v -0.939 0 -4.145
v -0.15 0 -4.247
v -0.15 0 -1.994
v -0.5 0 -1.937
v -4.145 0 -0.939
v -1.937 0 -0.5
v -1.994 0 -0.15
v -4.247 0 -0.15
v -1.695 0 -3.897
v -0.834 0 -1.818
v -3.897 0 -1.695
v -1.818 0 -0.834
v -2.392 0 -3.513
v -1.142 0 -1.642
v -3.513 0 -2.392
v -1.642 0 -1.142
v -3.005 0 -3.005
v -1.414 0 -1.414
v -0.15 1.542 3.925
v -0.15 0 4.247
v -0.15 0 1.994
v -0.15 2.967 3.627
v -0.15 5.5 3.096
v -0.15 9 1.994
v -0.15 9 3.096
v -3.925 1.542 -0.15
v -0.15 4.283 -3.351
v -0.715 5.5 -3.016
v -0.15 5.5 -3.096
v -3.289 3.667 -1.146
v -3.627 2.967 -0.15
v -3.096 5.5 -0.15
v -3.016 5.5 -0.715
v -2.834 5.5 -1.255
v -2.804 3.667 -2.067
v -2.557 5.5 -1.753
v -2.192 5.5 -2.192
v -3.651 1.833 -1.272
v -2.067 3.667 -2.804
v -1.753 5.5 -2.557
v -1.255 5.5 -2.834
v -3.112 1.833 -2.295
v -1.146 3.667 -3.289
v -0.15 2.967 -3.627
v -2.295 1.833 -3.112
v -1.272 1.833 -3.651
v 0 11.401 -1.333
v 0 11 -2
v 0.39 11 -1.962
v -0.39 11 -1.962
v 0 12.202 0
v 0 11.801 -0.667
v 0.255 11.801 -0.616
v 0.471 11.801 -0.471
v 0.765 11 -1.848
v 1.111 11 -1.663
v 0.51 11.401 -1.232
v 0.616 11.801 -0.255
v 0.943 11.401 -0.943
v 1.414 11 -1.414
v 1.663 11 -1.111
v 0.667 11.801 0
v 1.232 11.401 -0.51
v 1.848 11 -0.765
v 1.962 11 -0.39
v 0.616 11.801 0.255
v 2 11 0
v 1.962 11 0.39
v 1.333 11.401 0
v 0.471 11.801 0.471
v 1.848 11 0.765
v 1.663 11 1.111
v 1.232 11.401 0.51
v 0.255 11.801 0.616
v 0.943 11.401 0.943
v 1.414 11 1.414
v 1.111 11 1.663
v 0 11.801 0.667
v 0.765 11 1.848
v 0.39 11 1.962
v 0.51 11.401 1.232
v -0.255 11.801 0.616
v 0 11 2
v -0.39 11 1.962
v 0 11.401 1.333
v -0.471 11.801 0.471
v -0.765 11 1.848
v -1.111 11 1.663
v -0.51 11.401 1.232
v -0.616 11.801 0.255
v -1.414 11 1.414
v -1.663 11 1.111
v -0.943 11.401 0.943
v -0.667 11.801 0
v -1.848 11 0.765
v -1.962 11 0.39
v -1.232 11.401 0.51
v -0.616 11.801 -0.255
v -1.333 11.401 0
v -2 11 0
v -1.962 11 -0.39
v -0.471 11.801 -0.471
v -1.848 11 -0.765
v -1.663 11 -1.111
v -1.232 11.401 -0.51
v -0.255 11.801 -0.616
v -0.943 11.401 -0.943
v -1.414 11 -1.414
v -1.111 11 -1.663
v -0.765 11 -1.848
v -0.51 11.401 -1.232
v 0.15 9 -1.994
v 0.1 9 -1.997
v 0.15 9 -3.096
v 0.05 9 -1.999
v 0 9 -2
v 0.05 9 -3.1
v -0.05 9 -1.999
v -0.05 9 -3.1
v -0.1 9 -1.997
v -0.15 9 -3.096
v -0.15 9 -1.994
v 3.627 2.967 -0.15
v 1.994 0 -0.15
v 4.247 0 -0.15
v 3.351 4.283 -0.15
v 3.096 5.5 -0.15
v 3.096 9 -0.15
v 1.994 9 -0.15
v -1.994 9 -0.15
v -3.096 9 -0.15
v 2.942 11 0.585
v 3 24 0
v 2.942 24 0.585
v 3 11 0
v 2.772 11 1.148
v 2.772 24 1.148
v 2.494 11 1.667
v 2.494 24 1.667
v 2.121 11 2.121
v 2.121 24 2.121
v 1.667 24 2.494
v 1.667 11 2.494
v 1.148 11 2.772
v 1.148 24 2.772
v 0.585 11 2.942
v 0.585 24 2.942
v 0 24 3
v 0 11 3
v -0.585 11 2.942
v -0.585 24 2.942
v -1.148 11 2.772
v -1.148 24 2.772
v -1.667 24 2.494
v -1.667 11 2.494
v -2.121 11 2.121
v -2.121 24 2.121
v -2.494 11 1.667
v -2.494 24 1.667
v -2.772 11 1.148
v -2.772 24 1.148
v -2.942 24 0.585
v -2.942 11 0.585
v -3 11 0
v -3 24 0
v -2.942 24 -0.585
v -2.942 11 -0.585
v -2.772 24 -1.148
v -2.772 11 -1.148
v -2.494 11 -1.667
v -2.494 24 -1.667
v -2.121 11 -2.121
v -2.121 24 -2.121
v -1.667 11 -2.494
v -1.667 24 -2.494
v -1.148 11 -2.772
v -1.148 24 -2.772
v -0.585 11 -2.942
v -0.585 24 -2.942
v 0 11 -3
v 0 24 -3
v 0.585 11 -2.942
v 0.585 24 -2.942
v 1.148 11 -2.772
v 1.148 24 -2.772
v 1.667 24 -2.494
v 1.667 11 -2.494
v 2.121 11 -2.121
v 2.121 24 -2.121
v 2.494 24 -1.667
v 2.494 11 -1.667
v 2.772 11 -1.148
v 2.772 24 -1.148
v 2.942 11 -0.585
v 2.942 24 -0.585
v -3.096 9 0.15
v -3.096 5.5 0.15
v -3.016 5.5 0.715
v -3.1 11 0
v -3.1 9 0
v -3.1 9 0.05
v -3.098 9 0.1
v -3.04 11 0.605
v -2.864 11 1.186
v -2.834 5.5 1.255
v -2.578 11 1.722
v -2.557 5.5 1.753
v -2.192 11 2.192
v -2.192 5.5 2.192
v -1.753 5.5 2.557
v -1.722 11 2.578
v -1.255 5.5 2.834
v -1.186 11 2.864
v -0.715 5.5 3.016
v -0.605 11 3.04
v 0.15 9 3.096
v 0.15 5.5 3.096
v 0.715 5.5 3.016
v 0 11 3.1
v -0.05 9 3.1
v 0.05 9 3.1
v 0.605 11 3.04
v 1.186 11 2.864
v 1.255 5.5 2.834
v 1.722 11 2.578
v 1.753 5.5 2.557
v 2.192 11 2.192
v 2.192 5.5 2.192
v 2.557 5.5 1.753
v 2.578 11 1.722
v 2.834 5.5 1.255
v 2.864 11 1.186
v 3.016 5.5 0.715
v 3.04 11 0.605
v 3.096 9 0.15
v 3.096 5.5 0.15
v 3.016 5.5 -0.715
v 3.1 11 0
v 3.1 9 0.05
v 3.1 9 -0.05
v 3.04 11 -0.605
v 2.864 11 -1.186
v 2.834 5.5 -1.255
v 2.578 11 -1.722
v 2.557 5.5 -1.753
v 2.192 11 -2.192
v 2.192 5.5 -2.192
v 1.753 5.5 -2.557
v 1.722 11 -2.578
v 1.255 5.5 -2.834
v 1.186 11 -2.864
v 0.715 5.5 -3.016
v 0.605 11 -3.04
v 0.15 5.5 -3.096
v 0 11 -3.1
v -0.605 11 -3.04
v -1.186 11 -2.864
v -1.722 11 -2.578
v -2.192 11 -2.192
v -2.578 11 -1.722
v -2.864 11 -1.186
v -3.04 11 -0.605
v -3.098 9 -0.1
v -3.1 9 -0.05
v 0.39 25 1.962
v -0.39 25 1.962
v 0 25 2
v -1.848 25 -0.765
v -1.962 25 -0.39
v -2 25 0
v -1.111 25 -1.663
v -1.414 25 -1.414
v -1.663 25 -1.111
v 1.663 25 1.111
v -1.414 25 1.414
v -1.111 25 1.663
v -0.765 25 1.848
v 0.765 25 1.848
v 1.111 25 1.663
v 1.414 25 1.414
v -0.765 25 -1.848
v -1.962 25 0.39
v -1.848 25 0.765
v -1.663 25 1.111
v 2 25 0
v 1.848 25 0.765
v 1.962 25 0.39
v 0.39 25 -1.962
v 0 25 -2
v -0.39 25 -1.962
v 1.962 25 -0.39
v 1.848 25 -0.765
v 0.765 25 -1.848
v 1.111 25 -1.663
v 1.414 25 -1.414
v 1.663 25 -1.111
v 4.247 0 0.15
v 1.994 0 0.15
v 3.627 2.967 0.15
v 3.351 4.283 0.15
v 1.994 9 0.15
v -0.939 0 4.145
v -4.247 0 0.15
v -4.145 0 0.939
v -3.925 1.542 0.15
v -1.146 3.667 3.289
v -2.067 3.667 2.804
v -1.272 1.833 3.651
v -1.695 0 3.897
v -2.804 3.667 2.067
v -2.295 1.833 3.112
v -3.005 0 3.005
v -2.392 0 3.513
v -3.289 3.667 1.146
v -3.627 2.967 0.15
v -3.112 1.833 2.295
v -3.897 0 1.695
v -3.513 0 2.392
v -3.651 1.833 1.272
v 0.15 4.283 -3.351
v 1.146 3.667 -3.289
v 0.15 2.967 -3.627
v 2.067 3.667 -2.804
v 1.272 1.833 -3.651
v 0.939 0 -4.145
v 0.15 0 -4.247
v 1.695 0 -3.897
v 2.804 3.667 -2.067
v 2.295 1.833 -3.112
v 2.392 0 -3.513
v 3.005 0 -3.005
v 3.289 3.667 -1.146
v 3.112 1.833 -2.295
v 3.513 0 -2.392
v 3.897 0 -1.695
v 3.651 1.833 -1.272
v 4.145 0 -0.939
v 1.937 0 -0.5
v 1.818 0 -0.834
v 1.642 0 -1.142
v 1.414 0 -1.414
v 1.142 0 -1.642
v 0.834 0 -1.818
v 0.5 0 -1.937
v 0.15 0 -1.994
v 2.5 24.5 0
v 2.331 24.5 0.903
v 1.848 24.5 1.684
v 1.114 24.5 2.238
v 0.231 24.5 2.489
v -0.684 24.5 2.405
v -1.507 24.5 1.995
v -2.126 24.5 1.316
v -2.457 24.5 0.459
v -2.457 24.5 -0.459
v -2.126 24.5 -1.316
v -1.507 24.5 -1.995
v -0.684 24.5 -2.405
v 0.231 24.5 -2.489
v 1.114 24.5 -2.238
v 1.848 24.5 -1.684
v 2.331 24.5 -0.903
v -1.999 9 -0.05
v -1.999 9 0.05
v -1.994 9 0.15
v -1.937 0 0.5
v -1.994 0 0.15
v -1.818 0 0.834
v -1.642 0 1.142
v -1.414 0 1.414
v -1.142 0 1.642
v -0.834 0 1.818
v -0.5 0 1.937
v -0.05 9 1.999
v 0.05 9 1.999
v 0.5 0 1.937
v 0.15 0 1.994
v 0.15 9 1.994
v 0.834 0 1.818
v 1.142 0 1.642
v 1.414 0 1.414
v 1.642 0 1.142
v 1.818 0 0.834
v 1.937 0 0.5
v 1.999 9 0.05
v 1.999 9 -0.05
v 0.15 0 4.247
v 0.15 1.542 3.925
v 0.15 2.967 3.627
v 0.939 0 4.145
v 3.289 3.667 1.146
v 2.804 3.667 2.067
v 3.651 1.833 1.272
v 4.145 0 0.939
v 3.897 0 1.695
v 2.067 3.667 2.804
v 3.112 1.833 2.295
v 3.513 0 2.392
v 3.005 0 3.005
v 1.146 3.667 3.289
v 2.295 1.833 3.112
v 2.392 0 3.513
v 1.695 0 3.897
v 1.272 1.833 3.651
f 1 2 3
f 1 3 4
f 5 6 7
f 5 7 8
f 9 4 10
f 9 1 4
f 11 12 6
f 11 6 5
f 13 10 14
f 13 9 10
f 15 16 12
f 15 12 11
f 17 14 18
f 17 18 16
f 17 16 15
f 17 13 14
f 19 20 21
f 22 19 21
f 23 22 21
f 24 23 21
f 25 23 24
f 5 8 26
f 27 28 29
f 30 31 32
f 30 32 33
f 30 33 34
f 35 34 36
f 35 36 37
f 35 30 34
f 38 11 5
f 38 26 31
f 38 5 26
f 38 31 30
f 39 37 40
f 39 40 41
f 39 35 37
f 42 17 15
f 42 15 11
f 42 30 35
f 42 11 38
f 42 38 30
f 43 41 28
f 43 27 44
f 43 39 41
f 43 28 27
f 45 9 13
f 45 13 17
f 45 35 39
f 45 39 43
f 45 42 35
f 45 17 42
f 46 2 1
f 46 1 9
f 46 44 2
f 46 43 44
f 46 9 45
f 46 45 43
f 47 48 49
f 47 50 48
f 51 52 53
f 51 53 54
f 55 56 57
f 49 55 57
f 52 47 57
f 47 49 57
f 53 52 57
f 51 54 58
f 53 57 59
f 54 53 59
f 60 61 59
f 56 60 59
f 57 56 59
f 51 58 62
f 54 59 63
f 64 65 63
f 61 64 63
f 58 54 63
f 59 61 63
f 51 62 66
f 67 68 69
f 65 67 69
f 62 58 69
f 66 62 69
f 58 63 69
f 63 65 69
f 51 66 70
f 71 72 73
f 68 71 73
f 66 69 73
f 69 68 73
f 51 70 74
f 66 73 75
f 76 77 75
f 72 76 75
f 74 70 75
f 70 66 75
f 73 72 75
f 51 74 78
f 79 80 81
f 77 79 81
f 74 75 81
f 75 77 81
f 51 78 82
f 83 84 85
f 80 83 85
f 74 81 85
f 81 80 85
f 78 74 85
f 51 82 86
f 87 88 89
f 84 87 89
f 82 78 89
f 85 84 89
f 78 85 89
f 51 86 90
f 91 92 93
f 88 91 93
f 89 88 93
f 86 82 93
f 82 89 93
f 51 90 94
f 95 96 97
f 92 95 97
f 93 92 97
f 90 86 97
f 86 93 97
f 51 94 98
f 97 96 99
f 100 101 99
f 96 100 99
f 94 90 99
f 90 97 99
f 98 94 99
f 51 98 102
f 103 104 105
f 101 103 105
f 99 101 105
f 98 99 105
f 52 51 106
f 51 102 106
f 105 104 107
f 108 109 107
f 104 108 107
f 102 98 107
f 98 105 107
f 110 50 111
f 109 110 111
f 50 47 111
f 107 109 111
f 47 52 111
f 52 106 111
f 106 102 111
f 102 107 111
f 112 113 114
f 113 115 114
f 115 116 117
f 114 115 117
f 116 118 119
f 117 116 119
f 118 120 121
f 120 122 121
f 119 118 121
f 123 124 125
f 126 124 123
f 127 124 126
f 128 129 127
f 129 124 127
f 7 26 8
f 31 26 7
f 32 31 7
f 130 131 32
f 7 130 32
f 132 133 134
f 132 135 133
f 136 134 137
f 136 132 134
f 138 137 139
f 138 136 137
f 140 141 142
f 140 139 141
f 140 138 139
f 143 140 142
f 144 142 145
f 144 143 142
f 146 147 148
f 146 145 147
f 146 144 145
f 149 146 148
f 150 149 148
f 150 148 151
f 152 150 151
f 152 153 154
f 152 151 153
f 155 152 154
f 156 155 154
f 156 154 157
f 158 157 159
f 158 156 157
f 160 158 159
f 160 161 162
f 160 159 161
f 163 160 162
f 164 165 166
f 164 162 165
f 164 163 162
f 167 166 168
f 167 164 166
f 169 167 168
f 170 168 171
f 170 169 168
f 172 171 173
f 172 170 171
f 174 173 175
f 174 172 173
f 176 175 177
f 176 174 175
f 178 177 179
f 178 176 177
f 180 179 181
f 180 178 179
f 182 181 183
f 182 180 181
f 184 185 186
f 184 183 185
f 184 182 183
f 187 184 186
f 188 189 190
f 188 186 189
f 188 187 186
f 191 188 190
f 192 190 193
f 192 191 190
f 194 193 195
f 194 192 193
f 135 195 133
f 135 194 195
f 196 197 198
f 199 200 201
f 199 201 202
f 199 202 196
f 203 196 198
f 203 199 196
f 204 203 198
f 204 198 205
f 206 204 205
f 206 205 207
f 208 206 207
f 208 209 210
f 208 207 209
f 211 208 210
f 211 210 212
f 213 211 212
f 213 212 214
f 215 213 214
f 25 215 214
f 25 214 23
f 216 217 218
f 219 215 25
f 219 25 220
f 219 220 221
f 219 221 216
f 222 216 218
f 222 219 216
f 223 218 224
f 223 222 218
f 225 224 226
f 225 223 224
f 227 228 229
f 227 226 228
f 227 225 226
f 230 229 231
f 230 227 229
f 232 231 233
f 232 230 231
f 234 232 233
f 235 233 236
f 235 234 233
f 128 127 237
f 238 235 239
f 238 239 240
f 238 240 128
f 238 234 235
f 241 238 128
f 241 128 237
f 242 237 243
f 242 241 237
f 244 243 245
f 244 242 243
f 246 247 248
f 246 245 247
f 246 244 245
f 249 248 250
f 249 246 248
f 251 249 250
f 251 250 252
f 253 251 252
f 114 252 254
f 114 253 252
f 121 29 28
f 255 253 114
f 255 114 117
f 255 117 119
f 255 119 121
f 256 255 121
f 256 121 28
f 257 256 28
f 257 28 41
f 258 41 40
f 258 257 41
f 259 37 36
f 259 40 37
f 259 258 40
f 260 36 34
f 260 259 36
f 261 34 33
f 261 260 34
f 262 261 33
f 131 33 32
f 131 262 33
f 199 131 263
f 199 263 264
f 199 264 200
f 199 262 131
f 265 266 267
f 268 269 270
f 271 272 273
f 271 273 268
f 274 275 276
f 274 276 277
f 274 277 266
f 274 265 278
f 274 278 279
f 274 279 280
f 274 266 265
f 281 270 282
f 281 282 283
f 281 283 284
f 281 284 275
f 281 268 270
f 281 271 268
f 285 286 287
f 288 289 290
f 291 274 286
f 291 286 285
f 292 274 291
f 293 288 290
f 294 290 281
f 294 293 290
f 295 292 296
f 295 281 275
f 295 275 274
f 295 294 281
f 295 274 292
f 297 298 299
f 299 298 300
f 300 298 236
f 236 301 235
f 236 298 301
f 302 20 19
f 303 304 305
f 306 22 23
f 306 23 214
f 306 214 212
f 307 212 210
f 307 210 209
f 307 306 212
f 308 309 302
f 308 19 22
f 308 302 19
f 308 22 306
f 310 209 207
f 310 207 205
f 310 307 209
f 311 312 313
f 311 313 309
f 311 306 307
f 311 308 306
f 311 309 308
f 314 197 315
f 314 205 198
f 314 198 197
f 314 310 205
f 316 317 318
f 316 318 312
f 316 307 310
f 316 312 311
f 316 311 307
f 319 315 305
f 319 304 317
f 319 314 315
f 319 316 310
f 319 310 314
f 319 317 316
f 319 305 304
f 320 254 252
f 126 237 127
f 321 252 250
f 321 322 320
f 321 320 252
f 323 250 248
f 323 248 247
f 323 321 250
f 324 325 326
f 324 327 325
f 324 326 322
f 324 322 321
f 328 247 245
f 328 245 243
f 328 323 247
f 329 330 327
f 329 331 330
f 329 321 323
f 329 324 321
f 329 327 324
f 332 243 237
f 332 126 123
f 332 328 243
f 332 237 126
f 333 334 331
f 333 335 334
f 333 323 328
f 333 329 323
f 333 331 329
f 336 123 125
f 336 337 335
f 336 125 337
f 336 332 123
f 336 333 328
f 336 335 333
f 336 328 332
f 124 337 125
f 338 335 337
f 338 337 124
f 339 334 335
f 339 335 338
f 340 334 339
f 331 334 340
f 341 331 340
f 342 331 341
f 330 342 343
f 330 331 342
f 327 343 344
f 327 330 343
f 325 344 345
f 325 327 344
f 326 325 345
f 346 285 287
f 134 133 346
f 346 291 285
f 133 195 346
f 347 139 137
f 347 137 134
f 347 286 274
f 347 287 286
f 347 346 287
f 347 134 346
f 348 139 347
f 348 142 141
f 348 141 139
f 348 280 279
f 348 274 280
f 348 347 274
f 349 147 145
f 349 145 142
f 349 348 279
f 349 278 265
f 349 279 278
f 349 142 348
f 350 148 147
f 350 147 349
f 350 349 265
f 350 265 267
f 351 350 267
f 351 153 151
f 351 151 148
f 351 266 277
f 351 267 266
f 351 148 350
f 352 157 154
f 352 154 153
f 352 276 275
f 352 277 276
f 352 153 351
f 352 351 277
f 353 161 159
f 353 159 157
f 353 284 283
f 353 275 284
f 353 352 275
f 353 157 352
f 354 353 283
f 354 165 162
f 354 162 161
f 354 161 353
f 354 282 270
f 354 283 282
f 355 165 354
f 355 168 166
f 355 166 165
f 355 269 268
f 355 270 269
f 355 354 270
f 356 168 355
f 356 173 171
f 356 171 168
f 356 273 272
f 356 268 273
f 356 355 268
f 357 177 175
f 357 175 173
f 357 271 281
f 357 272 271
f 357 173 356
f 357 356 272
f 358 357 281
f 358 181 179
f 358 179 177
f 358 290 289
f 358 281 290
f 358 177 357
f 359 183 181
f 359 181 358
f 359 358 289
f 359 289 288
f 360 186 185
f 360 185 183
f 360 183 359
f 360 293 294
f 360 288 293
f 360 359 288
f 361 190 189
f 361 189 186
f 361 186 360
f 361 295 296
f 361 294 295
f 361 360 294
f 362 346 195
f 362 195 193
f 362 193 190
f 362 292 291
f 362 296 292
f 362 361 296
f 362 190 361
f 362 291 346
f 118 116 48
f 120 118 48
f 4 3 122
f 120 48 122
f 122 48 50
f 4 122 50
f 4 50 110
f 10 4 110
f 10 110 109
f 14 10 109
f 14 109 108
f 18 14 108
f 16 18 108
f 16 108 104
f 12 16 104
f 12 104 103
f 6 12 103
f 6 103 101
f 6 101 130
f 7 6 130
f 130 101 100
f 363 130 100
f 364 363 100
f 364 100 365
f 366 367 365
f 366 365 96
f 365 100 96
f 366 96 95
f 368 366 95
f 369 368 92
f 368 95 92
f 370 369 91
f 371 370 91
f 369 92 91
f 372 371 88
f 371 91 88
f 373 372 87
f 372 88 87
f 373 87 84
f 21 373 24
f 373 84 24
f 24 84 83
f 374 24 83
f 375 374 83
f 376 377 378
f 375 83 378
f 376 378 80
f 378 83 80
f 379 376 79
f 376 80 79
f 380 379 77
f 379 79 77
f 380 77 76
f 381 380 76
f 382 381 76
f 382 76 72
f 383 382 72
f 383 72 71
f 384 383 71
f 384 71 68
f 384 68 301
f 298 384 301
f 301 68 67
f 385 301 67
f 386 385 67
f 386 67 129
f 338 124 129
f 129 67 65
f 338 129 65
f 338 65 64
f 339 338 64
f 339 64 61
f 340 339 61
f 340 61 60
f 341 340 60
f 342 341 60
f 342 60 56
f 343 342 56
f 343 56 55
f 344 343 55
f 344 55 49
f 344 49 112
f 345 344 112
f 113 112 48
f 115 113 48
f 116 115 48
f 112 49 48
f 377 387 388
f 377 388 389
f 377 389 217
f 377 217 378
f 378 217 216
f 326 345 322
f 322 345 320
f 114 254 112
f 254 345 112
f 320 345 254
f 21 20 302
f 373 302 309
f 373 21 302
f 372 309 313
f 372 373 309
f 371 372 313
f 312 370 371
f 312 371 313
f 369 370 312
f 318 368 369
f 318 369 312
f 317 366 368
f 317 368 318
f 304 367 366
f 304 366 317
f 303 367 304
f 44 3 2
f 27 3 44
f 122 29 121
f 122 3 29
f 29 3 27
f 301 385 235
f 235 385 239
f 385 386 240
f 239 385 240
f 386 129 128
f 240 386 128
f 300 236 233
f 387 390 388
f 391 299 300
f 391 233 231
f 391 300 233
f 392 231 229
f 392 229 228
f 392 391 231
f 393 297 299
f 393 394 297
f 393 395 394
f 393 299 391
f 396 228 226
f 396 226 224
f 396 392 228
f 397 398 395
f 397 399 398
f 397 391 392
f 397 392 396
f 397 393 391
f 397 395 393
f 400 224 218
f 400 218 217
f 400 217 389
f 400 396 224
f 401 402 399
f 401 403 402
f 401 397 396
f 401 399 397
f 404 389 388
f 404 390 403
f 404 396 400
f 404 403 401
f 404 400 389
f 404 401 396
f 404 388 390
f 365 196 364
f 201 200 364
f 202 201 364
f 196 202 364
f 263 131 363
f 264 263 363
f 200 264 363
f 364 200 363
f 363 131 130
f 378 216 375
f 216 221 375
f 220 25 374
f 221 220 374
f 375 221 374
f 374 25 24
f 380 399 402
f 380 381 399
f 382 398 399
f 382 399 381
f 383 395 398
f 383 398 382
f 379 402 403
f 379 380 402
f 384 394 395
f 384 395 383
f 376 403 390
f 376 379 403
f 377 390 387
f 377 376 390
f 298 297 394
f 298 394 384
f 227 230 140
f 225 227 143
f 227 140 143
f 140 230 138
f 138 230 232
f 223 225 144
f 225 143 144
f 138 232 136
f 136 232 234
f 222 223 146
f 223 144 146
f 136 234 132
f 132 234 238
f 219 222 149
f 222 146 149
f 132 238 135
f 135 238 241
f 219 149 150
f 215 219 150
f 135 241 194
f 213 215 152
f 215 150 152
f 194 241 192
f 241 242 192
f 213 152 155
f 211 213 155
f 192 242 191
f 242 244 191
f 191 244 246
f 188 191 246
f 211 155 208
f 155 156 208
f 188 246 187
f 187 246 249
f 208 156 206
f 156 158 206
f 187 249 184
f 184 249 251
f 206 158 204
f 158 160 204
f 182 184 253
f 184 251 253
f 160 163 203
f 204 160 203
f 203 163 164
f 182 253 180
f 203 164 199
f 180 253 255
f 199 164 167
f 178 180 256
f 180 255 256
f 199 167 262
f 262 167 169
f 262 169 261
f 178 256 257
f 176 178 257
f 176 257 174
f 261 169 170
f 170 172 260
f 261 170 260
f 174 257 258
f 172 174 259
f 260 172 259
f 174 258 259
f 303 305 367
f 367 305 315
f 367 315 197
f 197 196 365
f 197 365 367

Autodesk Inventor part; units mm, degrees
ref_plane "YZ Plane" through (0, 0, 0) normal (1, 0, 0) x (0, 1, 0)
ref_plane "XZ Plane" through (0, 0, 0) normal (0, 1, 0) x (-1, 0, 0)
ref_plane "XY Plane" through (0, 0, 0) normal (0, 0, 1) x (1, 0, 0)
sketch "Sketch1" plane through (0, 0, 0) normal (0, 0, 1) x (1, 0, 0)
  line L0 (0, 0) -> (-4.25, 0) construction
  line L1 (-4.25, 0) -> (-4.25, 5.5) construction
  line L2 (-4.25, 5.5) -> (0, 5.5) construction
  line L3 (0, 5.5) -> (0, 0) construction
  line L4 (0, 5.5) -> (-3.1, 5.5) construction
  line L5 (-3.1, 5.5) -> (-3.1, 11) construction
  line L6 (-3.1, 11) -> (0, 11) construction
  line L7 (0, 11) -> (0, 5.5) construction
  line L8 (0, 0) -> (-4.25, 0)
  line L9 (-4.25, 0) -> (-3.1, 5.5)
  line L10 (-3.1, 5.5) -> (-3.1, 11)
  line L11 (-3.1, 11) -> (0, 11)
  line L12 (0, 11) -> (0, 0)
  dimension "d0" = 5.5
  dimension "d1" = 4.25
  dimension "d2" = 5.5
  dimension "d3" = 3.1
revolve "Revolution1" add sketch "Sketch1" angle 360 about axis through (0, 11, 0) along (0, -1, 0)
sketch "Sketch2" plane through (0, 11, 0) normal (0, 1, 0) x (1, 0, 0)
  circle A0 centre (0, 0) radius 3
  circle A1 centre (0, 0) radius 3.1 construction
  dimension "d5" = 6
extrude "Extrusion1" add sketch "Sketch2" along normal blind 14
thread "Thread1" size "M6x1" class "6g" standard "ANSI Metric M Profile" full length
chamfer "Chamfer1" distance 1 angle 45 1 edges at (-3, 25, 0)
sketch "Sketch3" plane through (0, 0, 0) normal (0, -1, 0) x (1, 0, 0)
  point P0 (0, 0)
  point P1 (0, 0)
hole "Hole1" at (0, 0, 0) direction (0, 1, 0) diameter 4 depth 11 tip angle 118
sketch "Sketch4" plane through (0, 0, 0) normal (1, 0, 0) x (0, 1, 0)
  line L0 (0, -4.25) -> (0, 4.25) projected
  line L1 (0, 4.25) -> (9, 4.25)
  line L2 (9, 4.25) -> (9, -4.25)
  line L3 (9, -4.25) -> (0, -4.25)
  line L4 (0, -4.25) -> (0, 4.25)
  point P0 (0, 0)
  dimension "d20" = 9
extrude "Extrusion2" cut sketch "Sketch4" along normal mid plane 0.3
sketch "Sketch5" plane through (0, 0, 0) normal (0, 0, 1) x (1, 0, 0)
  line L0 (4.25, 0) -> (3.1, 5.5) projected
  line L1 (4.25, 0) -> (-4.25, 0)
  line L2 (-4.25, 0) -> (-4.25, 9)
  line L3 (-4.25, 9) -> (4.25, 9)
  line L4 (4.25, 9) -> (4.25, 0)
  line L5 (0.15, 0) -> (0.15, 5.5) construction
  line L6 (0.15, 5.5) -> (0.15, 5.5) construction
  line L7 (0.15, 5.5) -> (0.15, 0) construction
  line L8 (0.15, 0) -> (0.15, 0) construction
  line L9 (-0.15, 5.5) -> (-0.15, 0) construction
  line L10 (-0.15, 0) -> (-0.15, 0) construction
  line L11 (-0.15, 0) -> (-0.15, 5.5) construction
  line L12 (-0.15, 5.5) -> (-0.15, 5.5) construction
  line L13 (-4.25, 0) -> (-3.1, 5.5) construction
  line L14 (-0.15, 0) -> (-4.25, 0) construction
  point P0 (0, 0)
  dimension "d23" = 9
extrude "Extrusion3" cut sketch "Sketch5" along normal mid plane 0.3
properties part number "collet_screw" material "Aluminum 6061"
